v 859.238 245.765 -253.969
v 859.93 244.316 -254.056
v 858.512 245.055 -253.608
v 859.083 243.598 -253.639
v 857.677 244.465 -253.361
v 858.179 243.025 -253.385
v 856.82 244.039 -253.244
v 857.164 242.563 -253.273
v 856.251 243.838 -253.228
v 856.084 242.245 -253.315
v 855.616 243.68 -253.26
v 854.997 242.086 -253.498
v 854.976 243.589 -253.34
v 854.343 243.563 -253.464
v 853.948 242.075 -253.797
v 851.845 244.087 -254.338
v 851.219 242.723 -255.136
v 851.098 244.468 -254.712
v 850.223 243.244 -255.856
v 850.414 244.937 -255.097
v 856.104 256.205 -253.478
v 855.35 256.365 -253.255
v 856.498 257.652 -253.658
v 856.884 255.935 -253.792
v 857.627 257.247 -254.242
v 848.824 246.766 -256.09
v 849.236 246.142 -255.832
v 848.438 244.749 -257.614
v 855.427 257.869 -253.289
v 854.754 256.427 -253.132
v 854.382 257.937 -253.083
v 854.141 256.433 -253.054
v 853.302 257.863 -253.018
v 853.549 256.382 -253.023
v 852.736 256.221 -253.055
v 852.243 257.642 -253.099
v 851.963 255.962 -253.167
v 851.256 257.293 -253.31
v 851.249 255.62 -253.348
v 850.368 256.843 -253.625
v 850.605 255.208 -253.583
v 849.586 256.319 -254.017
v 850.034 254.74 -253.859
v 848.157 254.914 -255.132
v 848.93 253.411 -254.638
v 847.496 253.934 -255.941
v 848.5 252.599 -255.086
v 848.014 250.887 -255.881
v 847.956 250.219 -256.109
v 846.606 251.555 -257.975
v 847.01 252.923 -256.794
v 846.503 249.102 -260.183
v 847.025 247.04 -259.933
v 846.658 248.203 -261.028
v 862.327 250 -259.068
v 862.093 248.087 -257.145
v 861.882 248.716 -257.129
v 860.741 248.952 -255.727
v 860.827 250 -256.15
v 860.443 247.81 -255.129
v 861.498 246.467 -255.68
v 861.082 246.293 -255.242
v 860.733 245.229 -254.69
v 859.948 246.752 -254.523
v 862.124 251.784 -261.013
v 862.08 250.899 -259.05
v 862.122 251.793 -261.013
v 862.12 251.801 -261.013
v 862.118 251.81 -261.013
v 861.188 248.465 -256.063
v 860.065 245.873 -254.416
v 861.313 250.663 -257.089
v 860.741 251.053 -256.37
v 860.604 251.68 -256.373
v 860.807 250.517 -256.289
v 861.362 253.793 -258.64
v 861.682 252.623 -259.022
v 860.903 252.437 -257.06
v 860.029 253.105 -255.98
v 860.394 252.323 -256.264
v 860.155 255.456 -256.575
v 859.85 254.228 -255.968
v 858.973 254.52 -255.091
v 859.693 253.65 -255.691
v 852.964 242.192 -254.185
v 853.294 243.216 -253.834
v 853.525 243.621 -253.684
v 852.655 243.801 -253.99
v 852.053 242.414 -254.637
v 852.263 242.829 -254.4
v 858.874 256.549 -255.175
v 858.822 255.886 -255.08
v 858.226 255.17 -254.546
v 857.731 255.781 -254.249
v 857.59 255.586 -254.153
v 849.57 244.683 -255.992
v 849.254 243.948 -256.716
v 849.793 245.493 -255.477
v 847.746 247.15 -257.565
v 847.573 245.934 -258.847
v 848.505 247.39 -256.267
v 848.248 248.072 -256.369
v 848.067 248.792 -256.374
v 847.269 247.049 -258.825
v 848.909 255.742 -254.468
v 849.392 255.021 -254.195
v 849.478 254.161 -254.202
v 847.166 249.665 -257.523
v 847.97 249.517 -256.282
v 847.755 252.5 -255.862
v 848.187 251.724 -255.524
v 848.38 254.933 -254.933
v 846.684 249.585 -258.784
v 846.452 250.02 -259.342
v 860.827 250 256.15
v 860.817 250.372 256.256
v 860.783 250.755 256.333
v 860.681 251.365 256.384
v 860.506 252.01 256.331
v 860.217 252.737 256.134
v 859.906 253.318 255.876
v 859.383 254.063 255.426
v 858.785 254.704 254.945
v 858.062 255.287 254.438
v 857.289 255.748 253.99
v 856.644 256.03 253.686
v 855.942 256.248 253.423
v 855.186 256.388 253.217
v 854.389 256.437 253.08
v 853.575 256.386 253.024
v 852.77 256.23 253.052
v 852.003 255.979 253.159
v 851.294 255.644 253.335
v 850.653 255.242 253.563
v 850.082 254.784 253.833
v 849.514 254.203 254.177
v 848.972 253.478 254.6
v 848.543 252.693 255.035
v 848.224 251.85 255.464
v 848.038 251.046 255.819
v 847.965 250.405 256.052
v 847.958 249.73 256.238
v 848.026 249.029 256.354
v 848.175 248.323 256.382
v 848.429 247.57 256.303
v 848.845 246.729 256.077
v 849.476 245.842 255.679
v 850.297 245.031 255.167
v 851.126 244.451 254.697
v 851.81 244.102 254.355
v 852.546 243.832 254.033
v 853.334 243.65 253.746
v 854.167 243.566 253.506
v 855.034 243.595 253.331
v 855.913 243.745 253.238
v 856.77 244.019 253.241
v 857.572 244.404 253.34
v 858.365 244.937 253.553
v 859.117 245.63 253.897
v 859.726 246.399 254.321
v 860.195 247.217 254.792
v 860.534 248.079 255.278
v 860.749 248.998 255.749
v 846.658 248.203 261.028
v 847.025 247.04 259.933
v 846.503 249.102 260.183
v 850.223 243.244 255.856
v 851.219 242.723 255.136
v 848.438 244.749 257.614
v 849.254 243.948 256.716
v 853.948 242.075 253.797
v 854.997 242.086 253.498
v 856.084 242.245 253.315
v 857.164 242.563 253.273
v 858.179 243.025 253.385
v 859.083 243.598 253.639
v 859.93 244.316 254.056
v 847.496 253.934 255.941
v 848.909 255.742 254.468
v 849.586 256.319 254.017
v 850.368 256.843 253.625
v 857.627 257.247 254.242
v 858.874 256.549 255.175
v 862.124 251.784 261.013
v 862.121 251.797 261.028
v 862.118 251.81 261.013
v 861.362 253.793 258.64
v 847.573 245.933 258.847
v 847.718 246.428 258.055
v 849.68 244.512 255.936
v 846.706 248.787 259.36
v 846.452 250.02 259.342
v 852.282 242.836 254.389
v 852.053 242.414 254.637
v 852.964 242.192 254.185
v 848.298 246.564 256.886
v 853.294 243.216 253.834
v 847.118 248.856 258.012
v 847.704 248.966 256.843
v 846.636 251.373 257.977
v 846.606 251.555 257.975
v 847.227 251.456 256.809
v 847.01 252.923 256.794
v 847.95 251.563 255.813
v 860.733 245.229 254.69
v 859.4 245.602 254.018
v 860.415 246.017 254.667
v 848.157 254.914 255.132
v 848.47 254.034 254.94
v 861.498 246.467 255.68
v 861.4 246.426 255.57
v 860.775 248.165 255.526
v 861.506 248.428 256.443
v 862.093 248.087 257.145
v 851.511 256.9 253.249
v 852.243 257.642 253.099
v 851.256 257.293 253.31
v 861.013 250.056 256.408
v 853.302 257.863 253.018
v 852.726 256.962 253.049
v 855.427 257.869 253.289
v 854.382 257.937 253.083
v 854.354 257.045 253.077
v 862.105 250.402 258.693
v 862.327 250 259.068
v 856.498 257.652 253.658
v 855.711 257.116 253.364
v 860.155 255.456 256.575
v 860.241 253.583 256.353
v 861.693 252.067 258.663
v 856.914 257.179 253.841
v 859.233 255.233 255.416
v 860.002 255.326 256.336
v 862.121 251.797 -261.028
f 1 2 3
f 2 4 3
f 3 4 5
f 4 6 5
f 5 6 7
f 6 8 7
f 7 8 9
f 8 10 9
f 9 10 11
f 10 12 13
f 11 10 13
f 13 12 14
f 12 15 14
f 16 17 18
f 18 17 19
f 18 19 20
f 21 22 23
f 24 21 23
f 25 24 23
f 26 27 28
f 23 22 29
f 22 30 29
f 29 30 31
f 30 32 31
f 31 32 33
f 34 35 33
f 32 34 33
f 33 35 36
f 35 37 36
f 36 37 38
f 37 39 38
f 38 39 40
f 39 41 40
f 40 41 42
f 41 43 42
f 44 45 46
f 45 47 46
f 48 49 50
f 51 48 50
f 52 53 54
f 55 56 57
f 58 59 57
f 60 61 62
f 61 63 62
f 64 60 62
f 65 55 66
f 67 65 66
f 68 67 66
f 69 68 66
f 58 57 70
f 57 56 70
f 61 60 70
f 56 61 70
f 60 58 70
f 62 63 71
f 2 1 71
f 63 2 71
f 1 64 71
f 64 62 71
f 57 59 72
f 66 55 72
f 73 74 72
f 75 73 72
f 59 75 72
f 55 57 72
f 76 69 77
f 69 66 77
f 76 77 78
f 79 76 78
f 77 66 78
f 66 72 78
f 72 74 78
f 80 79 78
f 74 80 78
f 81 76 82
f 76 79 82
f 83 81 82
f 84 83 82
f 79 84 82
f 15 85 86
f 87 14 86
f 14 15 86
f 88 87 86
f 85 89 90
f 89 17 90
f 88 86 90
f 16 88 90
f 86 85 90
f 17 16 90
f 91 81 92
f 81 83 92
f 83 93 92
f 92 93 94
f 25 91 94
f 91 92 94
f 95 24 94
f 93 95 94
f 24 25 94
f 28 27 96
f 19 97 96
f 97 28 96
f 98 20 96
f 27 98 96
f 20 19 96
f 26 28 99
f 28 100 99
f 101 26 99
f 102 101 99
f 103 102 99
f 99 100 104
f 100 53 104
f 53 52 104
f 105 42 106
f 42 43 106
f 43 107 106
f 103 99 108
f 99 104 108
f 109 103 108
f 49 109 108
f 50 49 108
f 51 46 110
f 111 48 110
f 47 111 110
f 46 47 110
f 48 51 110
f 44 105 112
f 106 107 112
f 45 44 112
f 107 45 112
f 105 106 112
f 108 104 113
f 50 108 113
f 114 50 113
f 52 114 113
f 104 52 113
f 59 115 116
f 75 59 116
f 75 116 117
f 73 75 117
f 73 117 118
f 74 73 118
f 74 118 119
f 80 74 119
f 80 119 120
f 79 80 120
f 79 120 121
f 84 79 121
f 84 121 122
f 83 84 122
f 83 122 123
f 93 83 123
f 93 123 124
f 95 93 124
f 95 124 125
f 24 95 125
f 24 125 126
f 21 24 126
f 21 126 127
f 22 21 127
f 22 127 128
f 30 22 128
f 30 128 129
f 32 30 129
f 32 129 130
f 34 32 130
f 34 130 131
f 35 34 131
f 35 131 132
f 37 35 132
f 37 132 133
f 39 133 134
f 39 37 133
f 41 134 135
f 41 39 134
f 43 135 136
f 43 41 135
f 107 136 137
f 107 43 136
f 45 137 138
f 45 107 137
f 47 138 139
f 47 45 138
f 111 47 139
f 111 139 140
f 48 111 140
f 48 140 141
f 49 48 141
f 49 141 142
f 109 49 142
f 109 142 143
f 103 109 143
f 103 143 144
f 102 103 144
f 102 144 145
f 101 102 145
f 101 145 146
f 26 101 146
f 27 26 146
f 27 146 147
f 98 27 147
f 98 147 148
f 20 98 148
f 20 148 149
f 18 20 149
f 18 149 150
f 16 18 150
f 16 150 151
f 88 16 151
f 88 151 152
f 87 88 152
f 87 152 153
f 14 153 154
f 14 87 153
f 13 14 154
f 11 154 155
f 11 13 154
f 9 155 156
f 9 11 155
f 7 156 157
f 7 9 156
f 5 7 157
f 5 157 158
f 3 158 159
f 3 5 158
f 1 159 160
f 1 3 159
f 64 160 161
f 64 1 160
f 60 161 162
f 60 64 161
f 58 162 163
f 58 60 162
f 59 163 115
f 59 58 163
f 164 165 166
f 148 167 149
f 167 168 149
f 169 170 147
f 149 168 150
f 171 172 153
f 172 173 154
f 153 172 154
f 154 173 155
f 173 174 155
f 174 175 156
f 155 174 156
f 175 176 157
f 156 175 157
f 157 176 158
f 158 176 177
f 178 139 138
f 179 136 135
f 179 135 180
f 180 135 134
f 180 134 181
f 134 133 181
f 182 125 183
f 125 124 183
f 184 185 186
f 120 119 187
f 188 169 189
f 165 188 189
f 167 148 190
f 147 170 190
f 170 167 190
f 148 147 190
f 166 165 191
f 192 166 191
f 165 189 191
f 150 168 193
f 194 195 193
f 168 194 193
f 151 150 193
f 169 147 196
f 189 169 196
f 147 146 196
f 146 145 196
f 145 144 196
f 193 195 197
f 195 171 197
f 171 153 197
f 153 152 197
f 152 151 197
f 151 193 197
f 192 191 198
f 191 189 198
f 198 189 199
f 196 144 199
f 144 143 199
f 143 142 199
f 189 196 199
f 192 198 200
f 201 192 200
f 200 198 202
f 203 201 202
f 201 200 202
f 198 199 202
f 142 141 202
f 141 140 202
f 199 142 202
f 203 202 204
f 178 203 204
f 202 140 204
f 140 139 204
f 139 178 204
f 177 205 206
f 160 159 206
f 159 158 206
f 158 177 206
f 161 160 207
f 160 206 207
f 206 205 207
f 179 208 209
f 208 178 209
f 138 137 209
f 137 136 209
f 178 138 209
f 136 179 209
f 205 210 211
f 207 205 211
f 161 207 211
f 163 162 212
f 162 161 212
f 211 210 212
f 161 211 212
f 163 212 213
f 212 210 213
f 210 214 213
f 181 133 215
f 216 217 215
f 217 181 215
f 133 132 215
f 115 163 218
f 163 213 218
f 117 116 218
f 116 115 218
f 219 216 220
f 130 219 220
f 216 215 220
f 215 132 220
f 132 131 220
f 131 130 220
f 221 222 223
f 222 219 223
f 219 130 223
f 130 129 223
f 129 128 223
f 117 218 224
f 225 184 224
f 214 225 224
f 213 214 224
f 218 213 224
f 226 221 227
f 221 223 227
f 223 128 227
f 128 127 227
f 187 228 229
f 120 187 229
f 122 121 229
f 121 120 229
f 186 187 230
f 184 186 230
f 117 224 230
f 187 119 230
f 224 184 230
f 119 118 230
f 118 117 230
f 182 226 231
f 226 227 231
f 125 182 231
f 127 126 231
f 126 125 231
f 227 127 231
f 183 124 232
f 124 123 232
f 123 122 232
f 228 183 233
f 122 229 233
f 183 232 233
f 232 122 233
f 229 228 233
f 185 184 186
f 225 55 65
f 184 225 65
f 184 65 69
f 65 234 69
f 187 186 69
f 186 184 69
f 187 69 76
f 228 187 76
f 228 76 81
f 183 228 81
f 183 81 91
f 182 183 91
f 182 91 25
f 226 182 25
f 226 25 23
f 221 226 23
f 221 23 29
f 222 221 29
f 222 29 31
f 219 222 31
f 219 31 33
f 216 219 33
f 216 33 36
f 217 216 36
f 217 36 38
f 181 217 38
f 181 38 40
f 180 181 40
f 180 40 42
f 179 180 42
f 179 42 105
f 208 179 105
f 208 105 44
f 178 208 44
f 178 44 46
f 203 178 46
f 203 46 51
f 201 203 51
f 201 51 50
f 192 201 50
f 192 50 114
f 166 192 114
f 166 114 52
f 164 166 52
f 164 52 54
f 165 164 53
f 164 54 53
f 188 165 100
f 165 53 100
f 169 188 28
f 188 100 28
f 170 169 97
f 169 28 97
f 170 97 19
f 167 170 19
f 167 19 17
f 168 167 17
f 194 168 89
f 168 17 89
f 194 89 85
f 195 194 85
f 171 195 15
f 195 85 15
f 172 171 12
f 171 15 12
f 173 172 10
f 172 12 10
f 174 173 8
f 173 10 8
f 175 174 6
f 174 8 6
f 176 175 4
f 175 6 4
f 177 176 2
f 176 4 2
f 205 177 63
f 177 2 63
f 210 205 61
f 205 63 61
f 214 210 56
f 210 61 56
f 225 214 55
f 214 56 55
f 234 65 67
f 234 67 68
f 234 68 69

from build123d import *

# Parameters (mm, degrees)
SKETCH1_R                          = 7.9375
SKETCH1_R_2                        = 6.437500000000001
PIPE_CONFIGURED_21_3_X_2_3_3_DEPTH = 522.055690959
ESBO_O11_R                         = 7.937500000000085
ESBO_O12_R                         = 7.937500000000085


with BuildPart() as part:
    # Sketch1 → Pipe - configured 21.3 X 2.3(3) (new body)
    with BuildSketch(Plane(origin=(854.3898367144717, 250, -261.0278454796051), x_dir=(1, 0, 0), z_dir=(0, 0, 1))):
        Circle(SKETCH1_R)
        Circle(SKETCH1_R_2, mode=Mode.SUBTRACT)
    extrude(amount=PIPE_CONFIGURED_21_3_X_2_3_3_DEPTH)

    # Varredura de corte1: sweep along a curve in space
    with BuildLine() as varredura_de_corte1_path:
        Line((910.0000000000001, 0, 265), (910.0000000000001, 139.26905749604418, 265))
        ThreePointArc((910.0000000000001, 139.26905749604418, 265), (908.6404967596997, 149.62181930014503, 264.9028926256928), (904.6546349379392, 159.26905749604424, 264.61818820985286))
        Line((904.6546349379392, 159.26905749604424, 264.61818820985286), (858.6941735437408, 239.0777295619333, 261.3352981102673))
        ThreePointArc((858.6941735437408, 239.0777295619333, 261.3352981102673), (854.2945586384378, 250.42014500440925, 261.02103990274554), (853.500633741435, 262.56395927183974, 260.964330981531))
        Line((853.500633741435, 262.56395927183974, 260.964330981531), (910.0000000000001, 910, 265))
    # Esboço11 → Varredura de corte1 (sweep, cut)
    with BuildSketch(Plane(origin=(0, 0, 0), x_dir=(1, 0, 0), z_dir=(0, 1, 0))):
        with Locations((910.0000000000001, -265)):
            Circle(ESBO_O11_R)
    sweep(path=varredura_de_corte1_path.line, mode=Mode.SUBTRACT)

    # Varredura de corte2: sweep along a curve in space
    with BuildLine() as varredura_de_corte2_path:
        Line((910.0000000000001, 0, -265), (910.0000000000001, 139.26905749604356, -265))
        ThreePointArc((910.0000000000001, 139.26905749604356, -265), (908.6404967596995, 149.62181930014447, -264.9028926256928), (904.6546349379391, 159.26905749604364, -264.6181882098528))
        Line((904.6546349379391, 159.26905749604364, -264.6181882098528), (858.6941735437406, 239.07772956193315, -261.33529811026716))
        ThreePointArc((858.6941735437406, 239.07772956193315, -261.33529811026716), (854.2945586384376, 250.4201450044091, -261.0210399027455), (853.5006337414345, 262.5639592718396, -260.96433098153096))
        Line((853.5006337414345, 262.5639592718396, -260.96433098153096), (910.0000000000001, 910, -265))
    # Esboço12 → Varredura de corte2 (sweep, cut)
    with BuildSketch(Plane(origin=(0, 0, 0), x_dir=(1, 0, 0), z_dir=(0, 1, 0))):
        with Locations((910.0000000000001, 265)):
            Circle(ESBO_O12_R)
    sweep(path=varredura_de_corte2_path.line, mode=Mode.SUBTRACT)


solid = part.part
